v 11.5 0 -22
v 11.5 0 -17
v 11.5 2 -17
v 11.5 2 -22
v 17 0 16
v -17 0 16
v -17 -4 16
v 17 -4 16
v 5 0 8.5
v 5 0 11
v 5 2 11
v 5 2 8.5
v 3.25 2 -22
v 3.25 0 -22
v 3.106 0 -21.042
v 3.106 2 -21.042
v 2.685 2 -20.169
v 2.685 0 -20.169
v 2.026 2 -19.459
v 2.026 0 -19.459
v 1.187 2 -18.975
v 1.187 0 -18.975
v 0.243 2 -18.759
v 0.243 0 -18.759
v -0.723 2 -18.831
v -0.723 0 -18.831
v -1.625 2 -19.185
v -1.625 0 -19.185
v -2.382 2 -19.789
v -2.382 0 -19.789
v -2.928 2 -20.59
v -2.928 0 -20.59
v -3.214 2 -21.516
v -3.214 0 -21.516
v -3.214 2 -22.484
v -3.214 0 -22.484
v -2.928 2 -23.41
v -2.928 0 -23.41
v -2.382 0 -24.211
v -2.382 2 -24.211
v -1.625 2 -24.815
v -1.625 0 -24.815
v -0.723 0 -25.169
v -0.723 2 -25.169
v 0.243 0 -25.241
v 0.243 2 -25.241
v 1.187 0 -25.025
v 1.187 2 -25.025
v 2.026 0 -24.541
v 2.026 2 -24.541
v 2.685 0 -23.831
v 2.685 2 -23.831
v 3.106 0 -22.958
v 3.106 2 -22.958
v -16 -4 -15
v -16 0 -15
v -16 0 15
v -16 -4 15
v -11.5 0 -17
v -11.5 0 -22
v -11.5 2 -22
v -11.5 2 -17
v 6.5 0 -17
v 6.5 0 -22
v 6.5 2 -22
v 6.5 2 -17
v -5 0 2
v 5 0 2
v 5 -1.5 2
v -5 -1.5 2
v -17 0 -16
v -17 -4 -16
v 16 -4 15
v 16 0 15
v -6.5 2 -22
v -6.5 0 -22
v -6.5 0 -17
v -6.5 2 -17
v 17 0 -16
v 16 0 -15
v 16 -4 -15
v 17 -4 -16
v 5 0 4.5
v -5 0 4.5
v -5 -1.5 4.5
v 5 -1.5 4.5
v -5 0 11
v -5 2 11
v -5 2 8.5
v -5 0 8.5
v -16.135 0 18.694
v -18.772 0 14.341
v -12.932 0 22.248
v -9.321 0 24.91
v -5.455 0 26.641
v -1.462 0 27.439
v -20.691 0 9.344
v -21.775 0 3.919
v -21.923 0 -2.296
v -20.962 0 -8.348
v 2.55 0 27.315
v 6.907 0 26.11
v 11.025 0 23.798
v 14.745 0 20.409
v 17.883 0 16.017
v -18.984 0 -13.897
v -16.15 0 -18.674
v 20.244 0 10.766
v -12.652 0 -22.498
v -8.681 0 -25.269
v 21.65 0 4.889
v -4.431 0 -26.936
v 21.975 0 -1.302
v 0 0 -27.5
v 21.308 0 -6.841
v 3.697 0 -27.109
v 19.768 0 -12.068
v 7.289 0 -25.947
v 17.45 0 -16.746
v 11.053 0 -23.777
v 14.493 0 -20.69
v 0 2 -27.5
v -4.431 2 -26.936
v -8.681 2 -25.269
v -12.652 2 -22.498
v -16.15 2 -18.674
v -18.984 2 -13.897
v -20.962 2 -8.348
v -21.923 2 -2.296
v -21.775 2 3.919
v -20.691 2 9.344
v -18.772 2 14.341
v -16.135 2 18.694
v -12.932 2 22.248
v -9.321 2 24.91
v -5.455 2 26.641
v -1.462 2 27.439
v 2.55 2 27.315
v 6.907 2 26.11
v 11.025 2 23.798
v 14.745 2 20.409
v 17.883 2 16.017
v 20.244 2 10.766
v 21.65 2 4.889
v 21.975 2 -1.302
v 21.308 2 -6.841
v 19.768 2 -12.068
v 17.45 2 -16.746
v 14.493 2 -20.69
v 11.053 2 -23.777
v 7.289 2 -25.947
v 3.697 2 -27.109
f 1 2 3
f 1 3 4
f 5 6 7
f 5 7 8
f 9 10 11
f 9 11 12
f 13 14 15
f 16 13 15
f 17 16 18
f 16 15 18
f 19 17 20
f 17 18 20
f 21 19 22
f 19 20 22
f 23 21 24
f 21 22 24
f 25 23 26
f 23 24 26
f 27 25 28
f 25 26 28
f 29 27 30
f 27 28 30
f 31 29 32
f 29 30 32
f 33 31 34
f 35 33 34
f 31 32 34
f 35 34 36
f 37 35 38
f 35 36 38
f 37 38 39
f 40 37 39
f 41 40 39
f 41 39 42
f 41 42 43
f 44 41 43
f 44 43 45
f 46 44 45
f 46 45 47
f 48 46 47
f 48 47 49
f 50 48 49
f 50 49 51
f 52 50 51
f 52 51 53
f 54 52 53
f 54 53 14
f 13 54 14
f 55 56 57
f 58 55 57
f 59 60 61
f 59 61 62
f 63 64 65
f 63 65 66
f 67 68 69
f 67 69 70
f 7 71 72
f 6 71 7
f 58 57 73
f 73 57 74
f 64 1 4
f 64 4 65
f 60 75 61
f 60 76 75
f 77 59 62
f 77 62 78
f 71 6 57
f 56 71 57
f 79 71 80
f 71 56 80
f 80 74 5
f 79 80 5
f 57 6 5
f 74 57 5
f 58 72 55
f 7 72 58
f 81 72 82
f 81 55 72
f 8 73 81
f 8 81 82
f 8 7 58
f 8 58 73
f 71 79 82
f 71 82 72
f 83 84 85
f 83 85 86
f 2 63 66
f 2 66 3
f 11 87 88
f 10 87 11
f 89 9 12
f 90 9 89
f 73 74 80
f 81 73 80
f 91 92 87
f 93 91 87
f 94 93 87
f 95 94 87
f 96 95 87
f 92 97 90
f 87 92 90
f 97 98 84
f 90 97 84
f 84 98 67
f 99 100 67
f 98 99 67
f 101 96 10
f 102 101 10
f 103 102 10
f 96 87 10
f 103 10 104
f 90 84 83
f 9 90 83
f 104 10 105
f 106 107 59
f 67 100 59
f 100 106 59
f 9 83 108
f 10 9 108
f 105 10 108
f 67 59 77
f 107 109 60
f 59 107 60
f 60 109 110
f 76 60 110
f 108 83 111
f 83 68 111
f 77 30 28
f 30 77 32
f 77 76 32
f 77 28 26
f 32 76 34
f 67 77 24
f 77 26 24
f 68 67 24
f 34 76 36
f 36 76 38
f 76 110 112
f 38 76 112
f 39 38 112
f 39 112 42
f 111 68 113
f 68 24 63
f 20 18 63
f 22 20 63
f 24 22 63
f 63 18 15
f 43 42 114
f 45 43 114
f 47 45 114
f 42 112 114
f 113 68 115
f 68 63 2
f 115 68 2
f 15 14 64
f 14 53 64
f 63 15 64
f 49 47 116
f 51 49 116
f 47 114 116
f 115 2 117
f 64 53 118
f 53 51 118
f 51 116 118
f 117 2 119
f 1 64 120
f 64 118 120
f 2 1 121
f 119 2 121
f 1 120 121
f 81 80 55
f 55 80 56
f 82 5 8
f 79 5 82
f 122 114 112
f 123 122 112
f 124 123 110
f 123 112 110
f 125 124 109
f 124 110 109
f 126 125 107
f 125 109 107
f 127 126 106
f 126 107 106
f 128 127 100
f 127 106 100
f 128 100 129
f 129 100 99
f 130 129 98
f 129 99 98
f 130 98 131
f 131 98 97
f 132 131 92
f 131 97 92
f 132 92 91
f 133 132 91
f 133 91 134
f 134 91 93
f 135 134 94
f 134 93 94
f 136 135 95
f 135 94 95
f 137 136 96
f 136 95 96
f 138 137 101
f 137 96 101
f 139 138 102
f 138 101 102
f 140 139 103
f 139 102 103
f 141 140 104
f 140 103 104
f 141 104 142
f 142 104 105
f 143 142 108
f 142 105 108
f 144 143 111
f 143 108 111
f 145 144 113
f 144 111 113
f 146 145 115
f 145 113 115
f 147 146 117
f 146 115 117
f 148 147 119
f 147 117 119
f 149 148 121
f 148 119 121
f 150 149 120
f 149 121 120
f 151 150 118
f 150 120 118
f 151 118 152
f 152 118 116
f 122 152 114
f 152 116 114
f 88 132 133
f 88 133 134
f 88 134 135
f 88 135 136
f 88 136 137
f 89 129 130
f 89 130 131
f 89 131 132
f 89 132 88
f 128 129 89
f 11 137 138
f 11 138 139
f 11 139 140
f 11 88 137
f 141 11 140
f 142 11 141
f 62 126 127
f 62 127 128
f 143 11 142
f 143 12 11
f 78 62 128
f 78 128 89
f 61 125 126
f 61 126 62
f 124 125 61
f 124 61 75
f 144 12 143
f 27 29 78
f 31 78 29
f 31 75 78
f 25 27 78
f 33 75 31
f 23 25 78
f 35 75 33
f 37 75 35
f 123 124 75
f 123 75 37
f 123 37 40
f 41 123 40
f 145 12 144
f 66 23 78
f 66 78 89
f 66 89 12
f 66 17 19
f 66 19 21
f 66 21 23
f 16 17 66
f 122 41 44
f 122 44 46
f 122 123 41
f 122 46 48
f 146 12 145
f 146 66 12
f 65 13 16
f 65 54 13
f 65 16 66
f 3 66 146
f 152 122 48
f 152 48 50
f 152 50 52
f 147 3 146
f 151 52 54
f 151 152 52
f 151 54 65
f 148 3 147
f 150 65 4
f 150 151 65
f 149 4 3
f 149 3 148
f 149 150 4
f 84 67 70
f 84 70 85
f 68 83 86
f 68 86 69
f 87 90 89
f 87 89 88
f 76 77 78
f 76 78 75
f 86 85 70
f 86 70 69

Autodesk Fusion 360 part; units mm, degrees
sketch "Sketch1" plane through (0, 0, 0) normal (0, 1, 0) x (1, 0, 0)
  ellipse E0 centre (0, 0) end of major axis (0, 27.5) minor radius 22
  line L0 (0, -27.5) -> (0, 27.5) construction
  line L1 (22, 0) -> (-22, 0) construction
  dimension "d34" = 55
  dimension "d35" = 44
extrude "Extrude1" add sketch "Sketch1" along normal blind 2 makes body 1
sketch "Sketch2" plane through (0, 0, 0) normal (0, -1, 0) x (1, 0, 0)
  line L0 (-17, 16) -> (17, 16)
  line L1 (17, 16) -> (17, -16)
  line L2 (17, -16) -> (-17, -16)
  line L3 (-17, -16) -> (-17, 16)
  line L4 (-16, 15) -> (16, 15)
  line L5 (16, 15) -> (16, -15)
  line L6 (16, -15) -> (-16, -15)
  line L7 (-16, -15) -> (-16, 15)
  ellipse E0 centre (0, 0) end of major axis (0, -27.5) minor radius 22
  point P0 (-9.0615, 23.3)
  point P1 (0, 27.5)
  point P2 (0, -27.5)
  dimension "d5" = 1
  dimension "d6" = 1
  dimension "d7" = 1
  dimension "d8" = 1
  dimension "d45" = 34
  dimension "d46" = 32
  dimension "d47" = 12.5
  dimension "d48" = 12.5
extrude "Extrude2" add sketch "Sketch2" along normal blind 4 separate body contours L0 L1 L2 L3 makes body 2
sketch "Sketch3" plane through (0, 0, 0) normal (0, -1, 0) x (1, 0, 0)
  line L0 (-5, 11) -> (5, 11)
  line L1 (5, 11) -> (5, 8.5)
  line L2 (5, 8.5) -> (-5, 8.5)
  line L3 (-5, 8.5) -> (-5, 11)
  line L4 (-16, 15) -> (16, 15)
  line L5 (-5, 4.5) -> (5, 4.5)
  line L6 (5, 4.5) -> (5, 2)
  line L7 (5, 2) -> (-5, 2)
  line L8 (-5, 2) -> (-5, 4.5)
  ellipse E0 centre (0, 0) end of major axis (0, -27.5) minor radius 22
  dimension "d11" = 2.5
  dimension "d12" = 10
  dimension "d13" = 4
  dimension "d14" = 2.5
  dimension "d15" = 10
  dimension "d16" = 4
extrude "Extrude3" cut sketch "Sketch3" against normal blind 12 contours L0 L1 L2 L3 bodies 1
extrude "Extrude4" add sketch "Sketch3" along normal blind 1.5 contours L5 L6 L7 L8 bodies 1
sketch "Sketch5" plane through (0, 0, 0) normal (0, -1, 0) x (1, 0, 0)
  line L0 (-5, 2) -> (-5, 4.5)
  line L1 (-5, 4.5) -> (5, 4.5)
  line L2 (5, 4.5) -> (5, 2)
  line L3 (5, 2) -> (-5, 2)
  line L4 (5, 11) -> (5, 8.5)
  line L5 (5, 8.5) -> (-5, 8.5)
  line L6 (-5, 8.5) -> (-5, 11)
  line L7 (-5, 11) -> (5, 11)
  ellipse E0 centre (0, 0) end of major axis (0, -27.5) minor radius 22
  line L8 (-11.5, -17) -> (-6.5, -17)
  line L9 (-6.5, -17) -> (-6.5, -22)
  line L10 (-6.5, -22) -> (-11.5, -22)
  line L11 (-11.5, -22) -> (-11.5, -17)
  line L12 (-17, -16) -> (17, -16)
  line L13 (6.5, -17) -> (11.5, -17)
  line L14 (11.5, -17) -> (11.5, -22)
  line L15 (11.5, -22) -> (6.5, -22)
  line L16 (6.5, -22) -> (6.5, -17)
  circle A0 centre (0, -22) radius 3.25
  line L17 (-17, -16) -> (-17, -24.6969) construction
  line L18 (17, -16) -> (17, -29.3033) construction
  dimension "d36" = 5
  dimension "d37" = 5
  dimension "d38" = 1
  dimension "d39" = 5
  dimension "d40" = 5
  dimension "d41" = 1
  dimension "d42" = 13
  dimension "d43" = 6.5
  dimension "d44" = 6
  dimension "d49" = 5.5
  dimension "d50" = 5.5
extrude "Extrude7" cut sketch "Sketch5" against normal blind 9 contours L8 L9 L10 L11 | L13 L14 L15 L16 | A0 bodies 1
